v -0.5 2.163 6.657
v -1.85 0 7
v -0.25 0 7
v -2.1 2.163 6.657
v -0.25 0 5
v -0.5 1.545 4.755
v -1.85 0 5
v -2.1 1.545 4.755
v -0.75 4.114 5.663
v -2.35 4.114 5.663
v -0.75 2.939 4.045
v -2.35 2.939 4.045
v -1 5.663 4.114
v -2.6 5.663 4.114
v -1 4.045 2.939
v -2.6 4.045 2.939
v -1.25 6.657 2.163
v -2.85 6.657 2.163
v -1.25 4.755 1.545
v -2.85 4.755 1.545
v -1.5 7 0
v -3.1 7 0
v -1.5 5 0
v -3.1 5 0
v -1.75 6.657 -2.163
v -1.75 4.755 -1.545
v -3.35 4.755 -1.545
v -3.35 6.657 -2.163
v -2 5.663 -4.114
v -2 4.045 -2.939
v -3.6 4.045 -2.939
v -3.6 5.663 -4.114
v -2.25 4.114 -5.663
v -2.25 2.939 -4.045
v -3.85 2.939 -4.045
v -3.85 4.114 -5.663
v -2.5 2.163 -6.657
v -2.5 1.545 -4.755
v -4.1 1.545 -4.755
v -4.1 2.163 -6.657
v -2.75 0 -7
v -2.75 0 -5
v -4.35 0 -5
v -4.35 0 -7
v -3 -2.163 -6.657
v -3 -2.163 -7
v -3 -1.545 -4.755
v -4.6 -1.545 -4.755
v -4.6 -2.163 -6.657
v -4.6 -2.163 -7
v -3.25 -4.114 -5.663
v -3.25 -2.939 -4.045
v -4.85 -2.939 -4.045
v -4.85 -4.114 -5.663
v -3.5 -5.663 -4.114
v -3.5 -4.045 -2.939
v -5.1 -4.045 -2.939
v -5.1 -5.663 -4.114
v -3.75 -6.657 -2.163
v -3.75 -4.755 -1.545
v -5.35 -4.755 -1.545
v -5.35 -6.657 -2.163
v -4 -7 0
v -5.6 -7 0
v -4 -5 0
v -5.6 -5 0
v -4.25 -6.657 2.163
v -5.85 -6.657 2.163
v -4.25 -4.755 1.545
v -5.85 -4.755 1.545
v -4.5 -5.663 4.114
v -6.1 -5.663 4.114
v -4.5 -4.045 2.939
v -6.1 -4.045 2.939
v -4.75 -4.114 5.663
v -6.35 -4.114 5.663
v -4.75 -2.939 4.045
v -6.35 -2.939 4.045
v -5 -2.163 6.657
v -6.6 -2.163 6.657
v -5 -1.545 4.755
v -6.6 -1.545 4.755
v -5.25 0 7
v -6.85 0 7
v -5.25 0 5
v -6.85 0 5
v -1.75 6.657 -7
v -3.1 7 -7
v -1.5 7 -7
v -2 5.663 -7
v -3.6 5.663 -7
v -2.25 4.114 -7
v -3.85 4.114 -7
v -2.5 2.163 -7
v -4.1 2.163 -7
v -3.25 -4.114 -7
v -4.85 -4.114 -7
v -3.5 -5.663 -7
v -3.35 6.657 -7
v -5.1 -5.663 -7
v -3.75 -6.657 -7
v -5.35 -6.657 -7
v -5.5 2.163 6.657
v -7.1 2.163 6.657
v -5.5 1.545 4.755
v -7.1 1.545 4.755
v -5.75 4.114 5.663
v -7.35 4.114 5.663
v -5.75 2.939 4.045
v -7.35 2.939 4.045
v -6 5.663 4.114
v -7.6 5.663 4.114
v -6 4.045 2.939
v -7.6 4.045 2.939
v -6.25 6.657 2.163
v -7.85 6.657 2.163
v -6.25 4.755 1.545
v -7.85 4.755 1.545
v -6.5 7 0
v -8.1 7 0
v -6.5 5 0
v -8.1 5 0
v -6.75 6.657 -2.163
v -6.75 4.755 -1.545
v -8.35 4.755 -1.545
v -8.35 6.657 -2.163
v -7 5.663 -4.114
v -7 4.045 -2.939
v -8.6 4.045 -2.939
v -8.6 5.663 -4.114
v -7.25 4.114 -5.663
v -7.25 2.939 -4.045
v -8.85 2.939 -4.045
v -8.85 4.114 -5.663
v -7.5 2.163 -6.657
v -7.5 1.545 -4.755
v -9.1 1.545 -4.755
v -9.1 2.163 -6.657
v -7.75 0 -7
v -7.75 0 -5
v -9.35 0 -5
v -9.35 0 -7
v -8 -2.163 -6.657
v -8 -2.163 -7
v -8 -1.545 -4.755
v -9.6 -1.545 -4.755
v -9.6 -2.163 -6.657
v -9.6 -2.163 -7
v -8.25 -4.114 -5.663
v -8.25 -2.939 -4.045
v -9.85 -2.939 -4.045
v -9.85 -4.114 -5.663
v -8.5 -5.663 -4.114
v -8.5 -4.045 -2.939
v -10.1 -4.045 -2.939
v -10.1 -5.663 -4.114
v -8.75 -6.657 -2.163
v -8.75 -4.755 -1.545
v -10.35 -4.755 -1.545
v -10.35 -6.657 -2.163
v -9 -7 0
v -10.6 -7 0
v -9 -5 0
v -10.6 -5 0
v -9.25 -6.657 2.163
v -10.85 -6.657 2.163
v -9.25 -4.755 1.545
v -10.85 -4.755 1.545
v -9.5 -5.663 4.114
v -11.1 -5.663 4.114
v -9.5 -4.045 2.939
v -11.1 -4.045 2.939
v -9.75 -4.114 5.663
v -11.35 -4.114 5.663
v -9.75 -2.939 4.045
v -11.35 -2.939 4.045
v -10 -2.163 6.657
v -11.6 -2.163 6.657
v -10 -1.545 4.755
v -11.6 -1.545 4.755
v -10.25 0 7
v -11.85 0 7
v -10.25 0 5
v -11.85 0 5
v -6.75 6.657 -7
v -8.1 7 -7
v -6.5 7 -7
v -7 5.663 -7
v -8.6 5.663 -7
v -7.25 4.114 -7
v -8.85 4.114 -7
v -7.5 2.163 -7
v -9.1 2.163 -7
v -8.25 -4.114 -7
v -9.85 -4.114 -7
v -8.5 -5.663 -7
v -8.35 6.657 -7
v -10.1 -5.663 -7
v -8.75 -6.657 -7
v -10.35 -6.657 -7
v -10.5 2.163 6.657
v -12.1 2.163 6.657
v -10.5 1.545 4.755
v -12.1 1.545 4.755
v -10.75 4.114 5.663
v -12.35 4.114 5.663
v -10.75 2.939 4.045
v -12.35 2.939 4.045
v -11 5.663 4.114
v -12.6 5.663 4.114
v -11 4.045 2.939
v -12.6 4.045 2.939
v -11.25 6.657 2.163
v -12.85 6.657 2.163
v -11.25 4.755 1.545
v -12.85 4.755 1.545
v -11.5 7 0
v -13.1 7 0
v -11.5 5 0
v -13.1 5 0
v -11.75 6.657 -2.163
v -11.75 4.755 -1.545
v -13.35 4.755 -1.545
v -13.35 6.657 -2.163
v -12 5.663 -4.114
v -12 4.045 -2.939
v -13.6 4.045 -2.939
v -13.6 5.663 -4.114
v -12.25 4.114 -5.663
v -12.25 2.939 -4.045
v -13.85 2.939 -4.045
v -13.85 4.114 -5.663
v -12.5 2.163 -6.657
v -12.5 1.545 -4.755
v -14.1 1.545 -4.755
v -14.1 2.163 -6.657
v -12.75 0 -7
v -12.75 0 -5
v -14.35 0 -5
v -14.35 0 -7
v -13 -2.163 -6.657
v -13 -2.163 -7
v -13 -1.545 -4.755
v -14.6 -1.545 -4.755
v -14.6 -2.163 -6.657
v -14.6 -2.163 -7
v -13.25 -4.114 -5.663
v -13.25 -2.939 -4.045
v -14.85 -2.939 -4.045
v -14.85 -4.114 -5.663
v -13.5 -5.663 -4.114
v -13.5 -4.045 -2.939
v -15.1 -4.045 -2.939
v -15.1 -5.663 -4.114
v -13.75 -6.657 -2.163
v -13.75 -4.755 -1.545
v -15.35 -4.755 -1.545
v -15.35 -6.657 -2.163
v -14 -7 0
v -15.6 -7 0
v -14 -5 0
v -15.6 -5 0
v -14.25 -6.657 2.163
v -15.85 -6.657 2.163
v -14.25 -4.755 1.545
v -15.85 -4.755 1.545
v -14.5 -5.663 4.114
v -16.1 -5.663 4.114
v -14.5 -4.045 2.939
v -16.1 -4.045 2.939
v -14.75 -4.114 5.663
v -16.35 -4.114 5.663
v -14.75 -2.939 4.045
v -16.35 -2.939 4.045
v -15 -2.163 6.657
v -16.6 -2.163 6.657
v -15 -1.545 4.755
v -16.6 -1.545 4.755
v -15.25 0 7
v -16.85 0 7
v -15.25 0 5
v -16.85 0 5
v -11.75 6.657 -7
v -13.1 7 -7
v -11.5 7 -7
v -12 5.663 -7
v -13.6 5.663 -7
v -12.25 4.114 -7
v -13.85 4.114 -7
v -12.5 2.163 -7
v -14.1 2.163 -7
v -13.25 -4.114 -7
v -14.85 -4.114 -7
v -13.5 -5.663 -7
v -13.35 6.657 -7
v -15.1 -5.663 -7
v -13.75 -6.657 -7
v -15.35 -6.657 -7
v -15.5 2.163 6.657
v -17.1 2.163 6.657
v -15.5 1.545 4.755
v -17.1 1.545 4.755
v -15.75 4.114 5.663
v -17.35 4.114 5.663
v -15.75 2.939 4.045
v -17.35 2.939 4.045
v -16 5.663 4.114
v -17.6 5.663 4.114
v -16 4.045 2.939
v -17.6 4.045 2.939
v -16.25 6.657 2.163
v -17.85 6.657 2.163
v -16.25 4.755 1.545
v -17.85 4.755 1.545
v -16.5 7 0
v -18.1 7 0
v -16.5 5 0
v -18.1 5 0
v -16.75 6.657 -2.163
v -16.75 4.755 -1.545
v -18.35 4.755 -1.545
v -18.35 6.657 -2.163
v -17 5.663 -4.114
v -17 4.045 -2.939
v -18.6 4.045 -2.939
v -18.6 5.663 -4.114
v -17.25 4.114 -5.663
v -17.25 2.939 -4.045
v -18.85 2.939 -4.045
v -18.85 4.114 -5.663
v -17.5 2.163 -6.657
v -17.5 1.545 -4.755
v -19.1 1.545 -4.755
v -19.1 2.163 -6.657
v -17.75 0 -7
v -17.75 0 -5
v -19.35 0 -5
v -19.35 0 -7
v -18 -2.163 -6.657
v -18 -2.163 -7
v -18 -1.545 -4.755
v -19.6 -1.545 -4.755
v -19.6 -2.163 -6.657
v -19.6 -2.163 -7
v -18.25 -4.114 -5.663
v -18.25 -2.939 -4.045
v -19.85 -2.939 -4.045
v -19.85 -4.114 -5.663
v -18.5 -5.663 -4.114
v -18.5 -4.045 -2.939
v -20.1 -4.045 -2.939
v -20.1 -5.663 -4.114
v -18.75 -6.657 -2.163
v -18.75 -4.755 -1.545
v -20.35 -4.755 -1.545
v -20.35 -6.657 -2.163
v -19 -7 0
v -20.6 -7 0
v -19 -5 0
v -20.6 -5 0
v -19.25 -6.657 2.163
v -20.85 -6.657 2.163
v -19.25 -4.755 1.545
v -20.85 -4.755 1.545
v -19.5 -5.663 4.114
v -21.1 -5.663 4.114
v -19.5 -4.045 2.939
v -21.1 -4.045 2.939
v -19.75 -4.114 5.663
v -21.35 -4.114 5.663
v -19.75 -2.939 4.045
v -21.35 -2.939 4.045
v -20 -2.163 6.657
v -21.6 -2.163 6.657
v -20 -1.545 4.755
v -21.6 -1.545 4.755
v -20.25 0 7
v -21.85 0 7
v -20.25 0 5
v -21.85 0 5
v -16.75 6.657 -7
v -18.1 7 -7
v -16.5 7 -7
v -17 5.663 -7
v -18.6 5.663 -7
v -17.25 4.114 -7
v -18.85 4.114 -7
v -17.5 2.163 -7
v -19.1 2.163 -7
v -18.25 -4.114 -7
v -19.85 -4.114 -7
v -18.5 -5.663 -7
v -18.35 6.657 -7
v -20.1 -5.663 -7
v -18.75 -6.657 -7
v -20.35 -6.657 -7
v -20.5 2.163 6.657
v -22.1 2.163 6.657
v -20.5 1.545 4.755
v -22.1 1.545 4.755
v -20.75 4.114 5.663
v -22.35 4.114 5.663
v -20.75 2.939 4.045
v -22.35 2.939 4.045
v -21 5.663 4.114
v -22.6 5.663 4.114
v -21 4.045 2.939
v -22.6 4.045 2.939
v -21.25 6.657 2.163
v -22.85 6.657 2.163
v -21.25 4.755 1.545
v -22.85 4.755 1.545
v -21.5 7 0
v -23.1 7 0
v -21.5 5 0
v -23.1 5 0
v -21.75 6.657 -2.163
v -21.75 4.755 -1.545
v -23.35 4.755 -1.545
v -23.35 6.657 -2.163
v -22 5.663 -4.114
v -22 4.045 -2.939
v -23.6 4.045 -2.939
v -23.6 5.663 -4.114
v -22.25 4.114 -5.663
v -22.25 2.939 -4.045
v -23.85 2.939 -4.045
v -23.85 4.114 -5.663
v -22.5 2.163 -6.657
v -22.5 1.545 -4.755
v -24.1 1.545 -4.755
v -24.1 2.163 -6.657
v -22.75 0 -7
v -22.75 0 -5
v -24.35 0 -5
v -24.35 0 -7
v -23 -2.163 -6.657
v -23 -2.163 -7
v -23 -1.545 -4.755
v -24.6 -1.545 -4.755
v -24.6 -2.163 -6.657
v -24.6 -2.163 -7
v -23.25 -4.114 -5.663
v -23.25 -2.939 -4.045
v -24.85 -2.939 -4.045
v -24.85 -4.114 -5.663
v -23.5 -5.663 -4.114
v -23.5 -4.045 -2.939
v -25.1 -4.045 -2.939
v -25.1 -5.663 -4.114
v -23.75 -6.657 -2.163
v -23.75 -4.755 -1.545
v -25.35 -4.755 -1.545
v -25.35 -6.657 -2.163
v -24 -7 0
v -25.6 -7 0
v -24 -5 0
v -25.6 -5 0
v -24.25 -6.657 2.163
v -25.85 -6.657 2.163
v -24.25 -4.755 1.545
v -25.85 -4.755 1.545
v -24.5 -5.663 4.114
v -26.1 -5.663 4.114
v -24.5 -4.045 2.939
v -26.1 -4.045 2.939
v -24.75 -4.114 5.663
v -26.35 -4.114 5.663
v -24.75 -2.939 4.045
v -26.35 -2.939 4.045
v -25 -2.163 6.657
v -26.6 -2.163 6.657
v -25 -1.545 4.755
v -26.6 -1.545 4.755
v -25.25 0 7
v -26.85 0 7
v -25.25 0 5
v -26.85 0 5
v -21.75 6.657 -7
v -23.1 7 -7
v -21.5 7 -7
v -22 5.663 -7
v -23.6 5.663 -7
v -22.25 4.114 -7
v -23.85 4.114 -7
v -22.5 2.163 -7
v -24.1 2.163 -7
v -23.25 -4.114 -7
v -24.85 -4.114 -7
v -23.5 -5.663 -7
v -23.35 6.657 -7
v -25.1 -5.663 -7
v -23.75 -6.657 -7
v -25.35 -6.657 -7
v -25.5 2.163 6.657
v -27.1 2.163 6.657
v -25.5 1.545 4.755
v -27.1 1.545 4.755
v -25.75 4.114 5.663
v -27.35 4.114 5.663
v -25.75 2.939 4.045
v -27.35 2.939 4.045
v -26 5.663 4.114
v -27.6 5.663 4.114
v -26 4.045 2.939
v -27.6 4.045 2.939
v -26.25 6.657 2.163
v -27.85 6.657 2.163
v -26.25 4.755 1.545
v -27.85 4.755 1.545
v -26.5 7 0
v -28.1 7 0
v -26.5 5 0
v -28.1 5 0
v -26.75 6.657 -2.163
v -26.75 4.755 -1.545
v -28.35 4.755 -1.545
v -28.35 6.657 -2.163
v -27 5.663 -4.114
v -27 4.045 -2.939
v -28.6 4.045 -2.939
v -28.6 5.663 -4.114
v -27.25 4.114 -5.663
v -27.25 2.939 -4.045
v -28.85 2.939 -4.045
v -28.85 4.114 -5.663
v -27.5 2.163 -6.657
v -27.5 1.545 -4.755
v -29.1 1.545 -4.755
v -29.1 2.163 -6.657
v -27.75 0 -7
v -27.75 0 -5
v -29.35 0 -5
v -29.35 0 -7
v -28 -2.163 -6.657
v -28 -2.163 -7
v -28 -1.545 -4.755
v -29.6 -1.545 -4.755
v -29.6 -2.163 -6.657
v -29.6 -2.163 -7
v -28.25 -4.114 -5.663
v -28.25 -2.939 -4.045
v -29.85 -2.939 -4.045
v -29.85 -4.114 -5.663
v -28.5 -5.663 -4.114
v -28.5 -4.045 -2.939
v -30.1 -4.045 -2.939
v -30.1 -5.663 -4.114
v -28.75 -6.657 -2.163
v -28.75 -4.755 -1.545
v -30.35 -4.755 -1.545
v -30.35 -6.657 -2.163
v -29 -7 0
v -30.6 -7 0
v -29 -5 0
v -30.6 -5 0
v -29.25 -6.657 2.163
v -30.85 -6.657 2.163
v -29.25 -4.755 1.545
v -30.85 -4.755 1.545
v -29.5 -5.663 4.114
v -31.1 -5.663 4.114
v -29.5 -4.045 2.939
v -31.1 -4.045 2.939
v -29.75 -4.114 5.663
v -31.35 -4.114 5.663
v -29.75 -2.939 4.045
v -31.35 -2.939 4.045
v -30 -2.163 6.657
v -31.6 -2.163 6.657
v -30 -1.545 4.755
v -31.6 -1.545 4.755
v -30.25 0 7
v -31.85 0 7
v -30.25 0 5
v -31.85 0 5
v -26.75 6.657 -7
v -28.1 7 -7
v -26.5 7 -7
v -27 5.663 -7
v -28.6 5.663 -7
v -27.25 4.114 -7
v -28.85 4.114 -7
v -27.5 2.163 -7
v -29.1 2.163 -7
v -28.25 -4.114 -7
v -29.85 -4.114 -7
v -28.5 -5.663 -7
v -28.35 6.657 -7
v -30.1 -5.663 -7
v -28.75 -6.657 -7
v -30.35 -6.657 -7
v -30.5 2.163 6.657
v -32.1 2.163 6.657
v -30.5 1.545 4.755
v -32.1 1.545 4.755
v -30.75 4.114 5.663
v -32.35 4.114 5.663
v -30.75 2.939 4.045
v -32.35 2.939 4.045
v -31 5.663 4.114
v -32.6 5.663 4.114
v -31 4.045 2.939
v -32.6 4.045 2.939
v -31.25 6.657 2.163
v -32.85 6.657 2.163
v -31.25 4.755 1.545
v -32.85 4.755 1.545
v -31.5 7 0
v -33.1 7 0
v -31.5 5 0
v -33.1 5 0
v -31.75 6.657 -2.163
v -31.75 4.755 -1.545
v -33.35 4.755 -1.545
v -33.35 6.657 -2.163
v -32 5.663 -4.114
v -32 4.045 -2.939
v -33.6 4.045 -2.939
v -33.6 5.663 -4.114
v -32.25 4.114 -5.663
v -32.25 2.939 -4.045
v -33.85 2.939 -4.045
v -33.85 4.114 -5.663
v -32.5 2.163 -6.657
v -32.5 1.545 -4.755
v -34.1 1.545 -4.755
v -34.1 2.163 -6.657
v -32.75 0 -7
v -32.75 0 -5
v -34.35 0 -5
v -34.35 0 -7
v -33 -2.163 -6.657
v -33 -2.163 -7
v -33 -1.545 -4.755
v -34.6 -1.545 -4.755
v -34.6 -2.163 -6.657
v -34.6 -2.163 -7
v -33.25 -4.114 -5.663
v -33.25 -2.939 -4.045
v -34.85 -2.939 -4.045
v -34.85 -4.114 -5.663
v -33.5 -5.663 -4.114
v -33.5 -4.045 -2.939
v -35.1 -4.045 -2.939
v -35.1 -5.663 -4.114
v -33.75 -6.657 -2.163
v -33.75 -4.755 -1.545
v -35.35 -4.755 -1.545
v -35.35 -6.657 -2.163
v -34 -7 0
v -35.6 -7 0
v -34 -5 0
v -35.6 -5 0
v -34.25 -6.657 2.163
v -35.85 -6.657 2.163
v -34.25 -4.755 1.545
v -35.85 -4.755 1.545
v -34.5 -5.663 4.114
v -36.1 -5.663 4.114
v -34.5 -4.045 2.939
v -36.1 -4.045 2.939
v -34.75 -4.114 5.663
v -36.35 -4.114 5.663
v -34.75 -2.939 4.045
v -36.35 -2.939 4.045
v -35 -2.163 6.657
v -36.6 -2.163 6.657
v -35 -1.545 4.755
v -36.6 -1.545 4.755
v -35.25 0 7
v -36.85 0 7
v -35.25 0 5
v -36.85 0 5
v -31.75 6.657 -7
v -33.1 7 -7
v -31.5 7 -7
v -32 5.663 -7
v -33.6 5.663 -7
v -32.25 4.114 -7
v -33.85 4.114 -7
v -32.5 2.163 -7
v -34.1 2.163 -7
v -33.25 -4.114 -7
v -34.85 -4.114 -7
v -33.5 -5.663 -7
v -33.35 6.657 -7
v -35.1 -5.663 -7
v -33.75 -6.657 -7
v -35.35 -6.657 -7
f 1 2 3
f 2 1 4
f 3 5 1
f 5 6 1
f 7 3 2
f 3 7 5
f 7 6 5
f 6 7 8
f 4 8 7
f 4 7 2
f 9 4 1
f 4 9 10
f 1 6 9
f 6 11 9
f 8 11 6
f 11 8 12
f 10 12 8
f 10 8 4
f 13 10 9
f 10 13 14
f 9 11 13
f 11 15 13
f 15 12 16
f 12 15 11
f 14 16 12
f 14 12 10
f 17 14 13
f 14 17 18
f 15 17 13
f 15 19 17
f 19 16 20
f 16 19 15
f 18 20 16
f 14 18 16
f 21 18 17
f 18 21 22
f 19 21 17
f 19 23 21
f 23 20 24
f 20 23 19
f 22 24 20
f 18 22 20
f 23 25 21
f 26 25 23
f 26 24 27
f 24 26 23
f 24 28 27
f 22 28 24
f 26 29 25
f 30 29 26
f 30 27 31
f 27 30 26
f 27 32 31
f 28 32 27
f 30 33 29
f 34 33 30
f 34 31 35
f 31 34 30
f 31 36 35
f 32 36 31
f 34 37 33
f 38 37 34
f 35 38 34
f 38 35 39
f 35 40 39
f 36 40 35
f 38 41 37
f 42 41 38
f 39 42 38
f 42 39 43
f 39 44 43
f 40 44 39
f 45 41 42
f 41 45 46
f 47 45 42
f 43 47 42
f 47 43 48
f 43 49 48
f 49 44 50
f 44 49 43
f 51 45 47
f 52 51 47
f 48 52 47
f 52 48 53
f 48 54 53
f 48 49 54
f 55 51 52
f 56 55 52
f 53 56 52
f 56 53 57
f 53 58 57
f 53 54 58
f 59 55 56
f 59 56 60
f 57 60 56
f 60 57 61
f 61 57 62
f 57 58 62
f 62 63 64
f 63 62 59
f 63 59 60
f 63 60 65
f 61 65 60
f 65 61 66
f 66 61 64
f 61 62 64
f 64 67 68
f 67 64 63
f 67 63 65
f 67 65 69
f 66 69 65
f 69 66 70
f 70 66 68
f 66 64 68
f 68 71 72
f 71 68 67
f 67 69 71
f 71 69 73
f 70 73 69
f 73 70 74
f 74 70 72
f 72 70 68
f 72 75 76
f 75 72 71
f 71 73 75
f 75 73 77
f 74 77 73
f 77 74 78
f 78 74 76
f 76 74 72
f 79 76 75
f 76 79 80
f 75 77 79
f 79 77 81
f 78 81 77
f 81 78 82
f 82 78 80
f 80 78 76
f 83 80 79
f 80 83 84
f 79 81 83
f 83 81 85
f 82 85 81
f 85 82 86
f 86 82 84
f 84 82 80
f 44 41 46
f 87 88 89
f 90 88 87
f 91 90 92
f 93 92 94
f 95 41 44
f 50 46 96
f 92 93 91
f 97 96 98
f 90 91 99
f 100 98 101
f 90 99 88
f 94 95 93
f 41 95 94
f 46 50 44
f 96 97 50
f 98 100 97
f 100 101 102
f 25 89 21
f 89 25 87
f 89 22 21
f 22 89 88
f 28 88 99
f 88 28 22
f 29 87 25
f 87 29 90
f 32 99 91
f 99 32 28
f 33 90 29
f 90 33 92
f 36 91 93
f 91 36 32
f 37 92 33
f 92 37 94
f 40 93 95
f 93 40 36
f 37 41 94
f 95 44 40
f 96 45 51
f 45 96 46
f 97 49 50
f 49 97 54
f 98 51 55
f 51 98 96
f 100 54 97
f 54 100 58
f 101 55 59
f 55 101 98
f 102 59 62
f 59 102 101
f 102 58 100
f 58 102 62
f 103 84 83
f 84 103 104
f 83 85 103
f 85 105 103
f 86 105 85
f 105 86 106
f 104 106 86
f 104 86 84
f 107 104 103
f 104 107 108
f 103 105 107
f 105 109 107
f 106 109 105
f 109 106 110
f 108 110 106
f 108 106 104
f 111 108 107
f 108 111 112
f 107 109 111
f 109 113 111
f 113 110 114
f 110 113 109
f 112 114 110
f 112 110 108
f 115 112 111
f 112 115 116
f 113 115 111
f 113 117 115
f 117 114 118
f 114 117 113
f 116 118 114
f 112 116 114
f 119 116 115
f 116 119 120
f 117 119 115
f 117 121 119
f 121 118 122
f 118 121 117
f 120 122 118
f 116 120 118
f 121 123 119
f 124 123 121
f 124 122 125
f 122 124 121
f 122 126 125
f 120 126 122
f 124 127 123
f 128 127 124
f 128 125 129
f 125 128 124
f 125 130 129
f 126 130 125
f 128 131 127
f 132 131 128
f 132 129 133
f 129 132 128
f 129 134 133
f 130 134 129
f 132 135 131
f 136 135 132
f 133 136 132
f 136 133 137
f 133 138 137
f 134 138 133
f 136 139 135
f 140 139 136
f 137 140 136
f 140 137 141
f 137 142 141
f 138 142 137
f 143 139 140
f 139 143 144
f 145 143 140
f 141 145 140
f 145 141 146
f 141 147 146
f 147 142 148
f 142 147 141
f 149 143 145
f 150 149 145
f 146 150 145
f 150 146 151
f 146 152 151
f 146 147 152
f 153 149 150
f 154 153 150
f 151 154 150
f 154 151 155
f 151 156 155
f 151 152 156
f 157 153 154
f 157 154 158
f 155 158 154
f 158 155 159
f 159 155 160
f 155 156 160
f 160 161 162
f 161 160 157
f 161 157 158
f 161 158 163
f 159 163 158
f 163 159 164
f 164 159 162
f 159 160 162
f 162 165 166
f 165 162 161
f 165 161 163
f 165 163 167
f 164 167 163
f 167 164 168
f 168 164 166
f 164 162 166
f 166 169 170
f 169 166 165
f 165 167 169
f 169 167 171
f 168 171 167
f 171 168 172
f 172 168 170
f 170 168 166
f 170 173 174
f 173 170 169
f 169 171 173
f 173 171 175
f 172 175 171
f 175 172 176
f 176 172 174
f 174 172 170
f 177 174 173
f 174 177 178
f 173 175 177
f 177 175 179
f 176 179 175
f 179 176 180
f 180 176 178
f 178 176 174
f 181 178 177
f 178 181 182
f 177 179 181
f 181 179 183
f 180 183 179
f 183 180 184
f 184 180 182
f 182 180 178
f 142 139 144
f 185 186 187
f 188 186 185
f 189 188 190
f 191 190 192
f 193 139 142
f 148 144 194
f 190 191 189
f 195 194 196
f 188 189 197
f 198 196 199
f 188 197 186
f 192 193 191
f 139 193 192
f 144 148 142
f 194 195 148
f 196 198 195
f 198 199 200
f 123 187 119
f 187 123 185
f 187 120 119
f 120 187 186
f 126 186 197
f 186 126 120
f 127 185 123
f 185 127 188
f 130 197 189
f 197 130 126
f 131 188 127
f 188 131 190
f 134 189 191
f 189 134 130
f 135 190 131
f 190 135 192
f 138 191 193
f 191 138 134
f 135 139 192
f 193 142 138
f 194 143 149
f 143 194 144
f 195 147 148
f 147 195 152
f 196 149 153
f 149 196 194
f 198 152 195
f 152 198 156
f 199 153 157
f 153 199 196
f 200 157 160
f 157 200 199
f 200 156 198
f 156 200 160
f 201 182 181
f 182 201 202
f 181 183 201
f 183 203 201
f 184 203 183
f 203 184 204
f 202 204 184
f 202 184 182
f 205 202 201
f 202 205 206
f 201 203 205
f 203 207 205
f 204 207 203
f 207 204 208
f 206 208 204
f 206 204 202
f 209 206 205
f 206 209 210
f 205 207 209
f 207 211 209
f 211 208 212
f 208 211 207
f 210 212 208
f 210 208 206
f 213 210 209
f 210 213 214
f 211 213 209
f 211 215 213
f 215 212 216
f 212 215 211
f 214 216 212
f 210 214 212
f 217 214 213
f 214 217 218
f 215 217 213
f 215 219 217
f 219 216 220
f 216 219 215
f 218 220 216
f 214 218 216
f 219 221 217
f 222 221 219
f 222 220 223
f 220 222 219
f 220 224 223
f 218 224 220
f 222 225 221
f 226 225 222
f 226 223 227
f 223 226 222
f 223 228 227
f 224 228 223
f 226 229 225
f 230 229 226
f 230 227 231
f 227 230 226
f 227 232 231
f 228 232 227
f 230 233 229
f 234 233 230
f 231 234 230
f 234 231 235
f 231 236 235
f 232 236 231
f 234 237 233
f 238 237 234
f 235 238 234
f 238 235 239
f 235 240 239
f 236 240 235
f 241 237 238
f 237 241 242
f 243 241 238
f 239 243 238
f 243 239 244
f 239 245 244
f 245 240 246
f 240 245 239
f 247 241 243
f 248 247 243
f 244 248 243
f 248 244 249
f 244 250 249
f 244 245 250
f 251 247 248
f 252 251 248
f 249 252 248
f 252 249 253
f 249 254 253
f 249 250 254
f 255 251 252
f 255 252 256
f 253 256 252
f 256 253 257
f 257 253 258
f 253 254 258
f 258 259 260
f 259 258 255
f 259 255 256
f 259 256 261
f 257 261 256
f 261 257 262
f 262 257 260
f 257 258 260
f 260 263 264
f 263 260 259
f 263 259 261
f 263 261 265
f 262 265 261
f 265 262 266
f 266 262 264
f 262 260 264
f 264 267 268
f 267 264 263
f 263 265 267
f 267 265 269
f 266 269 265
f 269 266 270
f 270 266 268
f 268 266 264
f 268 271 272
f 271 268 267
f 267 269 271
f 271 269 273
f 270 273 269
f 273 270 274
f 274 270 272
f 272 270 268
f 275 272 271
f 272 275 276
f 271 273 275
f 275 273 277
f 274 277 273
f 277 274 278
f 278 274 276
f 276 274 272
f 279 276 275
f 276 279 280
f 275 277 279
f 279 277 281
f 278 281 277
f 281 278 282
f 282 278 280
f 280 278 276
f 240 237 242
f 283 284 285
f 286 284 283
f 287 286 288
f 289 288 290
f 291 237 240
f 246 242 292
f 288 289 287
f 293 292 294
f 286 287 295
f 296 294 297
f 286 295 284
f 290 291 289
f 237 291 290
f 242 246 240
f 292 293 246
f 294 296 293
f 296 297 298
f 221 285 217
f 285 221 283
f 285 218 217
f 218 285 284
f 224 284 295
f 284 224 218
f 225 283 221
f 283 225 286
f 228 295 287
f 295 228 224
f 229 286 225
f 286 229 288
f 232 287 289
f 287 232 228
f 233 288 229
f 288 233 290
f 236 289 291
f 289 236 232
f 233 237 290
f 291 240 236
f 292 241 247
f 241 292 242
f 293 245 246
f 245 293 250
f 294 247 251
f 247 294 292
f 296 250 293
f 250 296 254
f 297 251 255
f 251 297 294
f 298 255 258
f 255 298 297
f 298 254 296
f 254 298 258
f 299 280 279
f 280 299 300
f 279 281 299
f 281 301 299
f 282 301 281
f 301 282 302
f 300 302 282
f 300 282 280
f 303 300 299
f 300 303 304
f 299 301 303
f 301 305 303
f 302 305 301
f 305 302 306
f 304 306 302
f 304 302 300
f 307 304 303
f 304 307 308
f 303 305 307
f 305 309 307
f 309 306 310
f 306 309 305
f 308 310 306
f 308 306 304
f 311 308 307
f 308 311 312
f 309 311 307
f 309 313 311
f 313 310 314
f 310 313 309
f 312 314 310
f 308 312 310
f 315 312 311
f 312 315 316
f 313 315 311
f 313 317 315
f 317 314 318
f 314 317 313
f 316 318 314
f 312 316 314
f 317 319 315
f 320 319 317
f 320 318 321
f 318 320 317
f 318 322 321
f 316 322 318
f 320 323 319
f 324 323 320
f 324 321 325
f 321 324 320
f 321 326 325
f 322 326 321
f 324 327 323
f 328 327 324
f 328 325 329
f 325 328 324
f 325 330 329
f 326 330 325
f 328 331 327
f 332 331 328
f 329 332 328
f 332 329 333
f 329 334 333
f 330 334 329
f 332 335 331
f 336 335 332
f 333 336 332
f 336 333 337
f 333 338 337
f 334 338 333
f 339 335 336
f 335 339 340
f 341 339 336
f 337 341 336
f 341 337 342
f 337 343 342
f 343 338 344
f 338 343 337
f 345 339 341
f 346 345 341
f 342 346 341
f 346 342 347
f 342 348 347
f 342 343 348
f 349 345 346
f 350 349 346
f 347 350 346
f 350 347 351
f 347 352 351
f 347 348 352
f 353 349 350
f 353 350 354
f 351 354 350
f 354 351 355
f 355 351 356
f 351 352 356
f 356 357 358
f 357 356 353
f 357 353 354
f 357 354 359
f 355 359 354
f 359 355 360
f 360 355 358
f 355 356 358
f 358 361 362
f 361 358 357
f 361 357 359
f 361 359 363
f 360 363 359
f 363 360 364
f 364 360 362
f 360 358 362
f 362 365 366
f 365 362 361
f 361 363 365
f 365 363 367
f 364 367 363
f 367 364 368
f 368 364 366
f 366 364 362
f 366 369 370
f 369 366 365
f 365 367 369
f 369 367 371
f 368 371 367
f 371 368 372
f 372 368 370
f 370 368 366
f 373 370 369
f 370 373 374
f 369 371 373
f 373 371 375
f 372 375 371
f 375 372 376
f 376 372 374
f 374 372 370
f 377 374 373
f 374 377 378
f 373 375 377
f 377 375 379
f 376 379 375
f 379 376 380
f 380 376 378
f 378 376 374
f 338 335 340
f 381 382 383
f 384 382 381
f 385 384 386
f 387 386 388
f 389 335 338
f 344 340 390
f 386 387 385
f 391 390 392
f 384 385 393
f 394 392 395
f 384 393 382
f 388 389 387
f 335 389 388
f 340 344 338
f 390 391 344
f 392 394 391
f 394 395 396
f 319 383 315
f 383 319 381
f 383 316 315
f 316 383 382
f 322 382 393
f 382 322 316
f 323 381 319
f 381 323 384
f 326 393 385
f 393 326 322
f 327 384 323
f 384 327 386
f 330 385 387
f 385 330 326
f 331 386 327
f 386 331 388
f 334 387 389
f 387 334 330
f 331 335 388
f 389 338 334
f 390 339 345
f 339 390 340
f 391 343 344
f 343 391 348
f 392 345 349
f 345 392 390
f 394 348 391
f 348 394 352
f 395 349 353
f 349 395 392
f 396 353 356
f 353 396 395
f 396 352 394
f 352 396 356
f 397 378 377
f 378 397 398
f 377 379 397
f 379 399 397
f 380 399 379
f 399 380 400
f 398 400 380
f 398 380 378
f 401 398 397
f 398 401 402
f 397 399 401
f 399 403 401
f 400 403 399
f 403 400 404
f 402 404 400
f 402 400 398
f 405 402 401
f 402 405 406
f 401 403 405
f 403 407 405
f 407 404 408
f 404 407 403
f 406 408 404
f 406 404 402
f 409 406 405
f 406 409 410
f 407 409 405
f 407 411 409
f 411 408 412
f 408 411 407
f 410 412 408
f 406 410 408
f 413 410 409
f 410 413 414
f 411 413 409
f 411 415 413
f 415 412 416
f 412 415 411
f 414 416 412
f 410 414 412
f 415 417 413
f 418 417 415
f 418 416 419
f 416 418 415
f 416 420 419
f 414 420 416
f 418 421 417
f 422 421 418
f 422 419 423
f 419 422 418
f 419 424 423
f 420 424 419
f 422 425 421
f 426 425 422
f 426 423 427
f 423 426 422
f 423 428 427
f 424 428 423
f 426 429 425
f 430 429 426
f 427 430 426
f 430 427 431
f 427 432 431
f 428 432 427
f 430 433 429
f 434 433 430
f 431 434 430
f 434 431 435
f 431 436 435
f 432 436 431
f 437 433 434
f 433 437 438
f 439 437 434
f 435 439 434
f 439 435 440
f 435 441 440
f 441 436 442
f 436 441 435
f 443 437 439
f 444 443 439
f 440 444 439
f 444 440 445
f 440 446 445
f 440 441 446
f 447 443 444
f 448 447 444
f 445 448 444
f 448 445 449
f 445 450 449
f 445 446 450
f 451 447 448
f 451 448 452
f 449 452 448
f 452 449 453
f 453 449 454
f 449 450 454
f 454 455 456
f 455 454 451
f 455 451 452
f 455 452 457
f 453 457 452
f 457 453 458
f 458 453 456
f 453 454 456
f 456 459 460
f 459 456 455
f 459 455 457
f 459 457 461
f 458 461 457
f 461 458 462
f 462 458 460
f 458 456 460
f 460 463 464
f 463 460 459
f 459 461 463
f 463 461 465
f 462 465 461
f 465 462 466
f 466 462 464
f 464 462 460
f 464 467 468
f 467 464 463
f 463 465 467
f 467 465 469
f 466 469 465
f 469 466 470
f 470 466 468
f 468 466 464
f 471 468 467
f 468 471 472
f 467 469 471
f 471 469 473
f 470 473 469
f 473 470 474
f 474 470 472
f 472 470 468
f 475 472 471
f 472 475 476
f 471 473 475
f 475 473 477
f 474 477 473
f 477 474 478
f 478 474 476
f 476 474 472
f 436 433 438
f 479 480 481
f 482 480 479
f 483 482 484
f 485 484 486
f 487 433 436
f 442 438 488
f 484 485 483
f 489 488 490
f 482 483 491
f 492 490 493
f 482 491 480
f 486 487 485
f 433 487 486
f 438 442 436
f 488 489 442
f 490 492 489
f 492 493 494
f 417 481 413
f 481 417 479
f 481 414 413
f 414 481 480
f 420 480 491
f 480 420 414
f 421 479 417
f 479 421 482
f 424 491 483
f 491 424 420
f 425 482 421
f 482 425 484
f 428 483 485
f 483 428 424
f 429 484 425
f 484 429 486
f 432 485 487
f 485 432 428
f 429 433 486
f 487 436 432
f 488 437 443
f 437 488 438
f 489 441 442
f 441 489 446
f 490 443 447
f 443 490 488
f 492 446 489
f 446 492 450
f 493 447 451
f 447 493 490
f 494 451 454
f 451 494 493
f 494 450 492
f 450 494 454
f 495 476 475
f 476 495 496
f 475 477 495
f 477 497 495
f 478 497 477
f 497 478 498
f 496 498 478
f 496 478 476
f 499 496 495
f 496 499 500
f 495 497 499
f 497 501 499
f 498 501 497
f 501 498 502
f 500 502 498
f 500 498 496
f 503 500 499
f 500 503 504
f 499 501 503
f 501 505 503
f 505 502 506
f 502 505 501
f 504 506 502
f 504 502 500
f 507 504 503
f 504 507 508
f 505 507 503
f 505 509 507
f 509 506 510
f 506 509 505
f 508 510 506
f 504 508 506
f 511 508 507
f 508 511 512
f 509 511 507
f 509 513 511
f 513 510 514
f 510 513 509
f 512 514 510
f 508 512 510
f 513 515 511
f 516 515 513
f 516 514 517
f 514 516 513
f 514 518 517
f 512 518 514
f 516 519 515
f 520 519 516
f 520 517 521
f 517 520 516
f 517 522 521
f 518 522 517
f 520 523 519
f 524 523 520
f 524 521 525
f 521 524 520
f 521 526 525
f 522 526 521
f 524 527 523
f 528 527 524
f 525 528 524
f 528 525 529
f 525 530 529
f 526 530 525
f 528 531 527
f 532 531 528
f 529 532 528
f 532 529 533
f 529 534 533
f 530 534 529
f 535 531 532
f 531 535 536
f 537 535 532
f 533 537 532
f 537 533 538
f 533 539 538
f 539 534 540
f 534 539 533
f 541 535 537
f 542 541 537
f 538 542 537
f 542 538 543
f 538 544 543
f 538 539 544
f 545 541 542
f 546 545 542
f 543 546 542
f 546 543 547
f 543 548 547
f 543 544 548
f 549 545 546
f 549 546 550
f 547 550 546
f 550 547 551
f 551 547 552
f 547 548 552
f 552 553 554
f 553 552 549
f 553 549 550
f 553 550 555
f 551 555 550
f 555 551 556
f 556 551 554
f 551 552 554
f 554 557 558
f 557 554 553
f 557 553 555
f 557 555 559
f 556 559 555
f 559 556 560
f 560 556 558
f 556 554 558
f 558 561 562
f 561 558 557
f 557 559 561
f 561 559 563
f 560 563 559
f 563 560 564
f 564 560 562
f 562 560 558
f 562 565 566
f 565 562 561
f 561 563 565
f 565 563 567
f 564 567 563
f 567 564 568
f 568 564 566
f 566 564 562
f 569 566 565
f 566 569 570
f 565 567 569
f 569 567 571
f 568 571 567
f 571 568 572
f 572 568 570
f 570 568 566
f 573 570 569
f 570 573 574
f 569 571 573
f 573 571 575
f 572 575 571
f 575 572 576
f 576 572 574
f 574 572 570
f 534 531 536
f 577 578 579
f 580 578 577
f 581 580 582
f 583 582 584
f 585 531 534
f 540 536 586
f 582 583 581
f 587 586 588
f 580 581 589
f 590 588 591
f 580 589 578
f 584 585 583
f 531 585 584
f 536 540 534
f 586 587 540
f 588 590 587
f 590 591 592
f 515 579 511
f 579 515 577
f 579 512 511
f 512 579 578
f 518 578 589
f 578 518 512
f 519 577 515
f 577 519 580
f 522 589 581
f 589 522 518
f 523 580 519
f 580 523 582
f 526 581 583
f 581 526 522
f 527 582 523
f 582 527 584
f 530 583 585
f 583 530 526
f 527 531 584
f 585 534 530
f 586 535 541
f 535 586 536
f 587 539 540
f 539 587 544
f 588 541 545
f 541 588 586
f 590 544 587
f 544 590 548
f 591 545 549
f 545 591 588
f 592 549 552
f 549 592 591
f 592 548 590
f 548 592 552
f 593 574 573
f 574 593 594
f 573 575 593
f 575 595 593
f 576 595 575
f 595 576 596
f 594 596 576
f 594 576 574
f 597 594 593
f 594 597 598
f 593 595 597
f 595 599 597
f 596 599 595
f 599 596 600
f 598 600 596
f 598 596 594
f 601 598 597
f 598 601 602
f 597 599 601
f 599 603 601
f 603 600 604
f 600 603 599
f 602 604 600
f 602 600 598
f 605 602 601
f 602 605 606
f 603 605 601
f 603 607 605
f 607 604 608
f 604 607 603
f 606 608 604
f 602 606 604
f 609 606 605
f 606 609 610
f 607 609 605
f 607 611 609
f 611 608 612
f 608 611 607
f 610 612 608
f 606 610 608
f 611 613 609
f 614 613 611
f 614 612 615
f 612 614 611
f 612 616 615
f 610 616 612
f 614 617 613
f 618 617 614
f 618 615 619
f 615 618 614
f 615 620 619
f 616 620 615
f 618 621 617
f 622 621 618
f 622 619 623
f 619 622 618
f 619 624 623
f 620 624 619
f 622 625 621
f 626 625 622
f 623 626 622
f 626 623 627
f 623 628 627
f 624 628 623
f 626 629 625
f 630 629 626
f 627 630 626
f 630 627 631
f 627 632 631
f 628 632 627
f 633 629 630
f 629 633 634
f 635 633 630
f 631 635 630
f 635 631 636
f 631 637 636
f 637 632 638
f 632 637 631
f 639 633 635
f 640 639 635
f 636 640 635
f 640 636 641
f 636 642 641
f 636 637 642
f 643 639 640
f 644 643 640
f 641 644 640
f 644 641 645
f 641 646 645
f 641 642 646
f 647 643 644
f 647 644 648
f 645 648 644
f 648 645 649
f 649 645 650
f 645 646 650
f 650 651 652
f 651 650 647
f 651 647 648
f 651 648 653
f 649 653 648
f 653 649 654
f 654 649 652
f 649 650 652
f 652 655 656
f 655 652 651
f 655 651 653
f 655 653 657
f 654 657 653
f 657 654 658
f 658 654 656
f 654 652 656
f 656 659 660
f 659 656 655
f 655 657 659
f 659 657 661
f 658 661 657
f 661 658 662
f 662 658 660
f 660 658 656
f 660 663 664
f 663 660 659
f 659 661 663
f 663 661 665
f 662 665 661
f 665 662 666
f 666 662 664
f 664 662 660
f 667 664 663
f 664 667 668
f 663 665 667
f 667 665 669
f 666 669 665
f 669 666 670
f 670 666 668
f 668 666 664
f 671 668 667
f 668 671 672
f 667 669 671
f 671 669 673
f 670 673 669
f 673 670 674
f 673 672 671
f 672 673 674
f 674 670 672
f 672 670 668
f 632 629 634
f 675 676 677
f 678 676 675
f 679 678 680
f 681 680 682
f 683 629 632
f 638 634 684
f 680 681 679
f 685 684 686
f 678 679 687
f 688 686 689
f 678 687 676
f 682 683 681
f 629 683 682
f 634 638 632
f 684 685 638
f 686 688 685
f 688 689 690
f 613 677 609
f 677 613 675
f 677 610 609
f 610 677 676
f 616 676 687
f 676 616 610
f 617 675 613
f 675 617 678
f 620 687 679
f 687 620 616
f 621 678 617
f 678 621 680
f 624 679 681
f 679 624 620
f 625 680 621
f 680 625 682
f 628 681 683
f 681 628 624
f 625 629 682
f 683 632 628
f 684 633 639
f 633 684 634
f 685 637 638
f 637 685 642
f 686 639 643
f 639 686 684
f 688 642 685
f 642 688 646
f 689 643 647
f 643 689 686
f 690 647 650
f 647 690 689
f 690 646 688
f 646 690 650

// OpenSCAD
/*
  3D Printed Spring
  Copyright Nir Dobovizki 2016
  Provided under the Creative Commons Attribution-NonCommercial 4.0 International (CC-BY-NC)
  Contact me at nir@nbdtech.com
*/

// Number of sides
sides = 20;
// Inner radius of the loops
radius = 5;
// Number of loops
loops = 7;
// Loops width
width = 2;
// Loop thickness
height = 1.6;
// distance between loops
loopHeight = 5;
 
ptOuter = ngon(sides,radius+width);
ptInner = ngon(sides,radius);

rotate([0,270,0])
union(){

for(i=[0:loops-1])
{
    base = loopHeight*i;

    for(j=[1:sides])
    {
        polyhedron(
            points = [
                [ptOuter[(j-1)%sides][0],ptOuter[((j-1)%sides)%sides][1],base+(j*(loopHeight/sides))],
                [ptOuter[j%sides][0],ptOuter[j%sides][1],base+((j+1)*(loopHeight/sides))],
                [ptOuter[(j-1)%sides][0],ptOuter[(j-1)%sides][1],base+height+(j*(loopHeight/sides))],
                [ptOuter[j%sides][0],ptOuter[j%sides][1],base+height+((j+1)*(loopHeight/sides))],
                [ptInner[(j-1)%sides][0],ptInner[(j-1)%sides][1],base+(j*(loopHeight/sides))],
                [ptInner[j%sides][0],ptInner[j%sides][1],base+((j+1)*(loopHeight/sides))],
                [ptInner[(j-1)%sides][0],ptInner[(j-1)%sides][1],base+height+(j*(loopHeight/sides))],
                [ptInner[j%sides][0],ptInner[j%sides][1],base+height+((j+1)*(loopHeight/sides))]
                ],
            faces = [
                [0,1,2],[1,3,2], //right
                [1,0,4],[4,5,1], //bottom
                [2,4,0],[2,6,4], //back
                [6,5,4],[6,7,5], //left
                [1,5,7],[7,3,1], //front
                [3,7,6],[6,2,3]  //top
        ]);
    }
    for(j=[sides/4+1:(sides/4)*3-1])
    {
        polyhedron(
            points = [
                [-(radius+width),ptOuter[((j-1)%sides)%sides][1],base+(j*(loopHeight/sides))],
                [-(radius+width),ptOuter[j%sides][1],base+((j+1)*(loopHeight/sides))],
                [-(radius+width),ptOuter[(j-1)%sides][1],base+height+(j*(loopHeight/sides))],
                [-(radius+width),ptOuter[j%sides][1],base+height+((j+1)*(loopHeight/sides))],
                [ptOuter[(j-1)%sides][0],ptOuter[((j-1)%sides)%sides][1],base+(j*(loopHeight/sides))],
                [ptOuter[j%sides][0],ptOuter[j%sides][1],base+((j+1)*(loopHeight/sides))],
                [ptOuter[(j-1)%sides][0],ptOuter[(j-1)%sides][1],base+height+((j)*(loopHeight/sides))],
                [ptOuter[j%sides][0],ptOuter[j%sides][1],base+height+((j+1)*(loopHeight/sides))]
                ],
            faces = [
                [0,1,2],[1,3,2], //right
                [1,0,4],[4,5,1], //bottom
                [2,4,0],[2,6,4], //back
                [6,5,4],[6,7,5], //left
                [1,5,7],[7,3,1], //front
                [3,7,6],[6,2,3]  //top
        ]);
    }
}
 
 }
// Simple list comprehension for creating N-gon vertices
function ngon(num, r) = 
  [for (i=[0:num-1], a=i*360/num) [ r*cos(a), r*sin(a) ]];
